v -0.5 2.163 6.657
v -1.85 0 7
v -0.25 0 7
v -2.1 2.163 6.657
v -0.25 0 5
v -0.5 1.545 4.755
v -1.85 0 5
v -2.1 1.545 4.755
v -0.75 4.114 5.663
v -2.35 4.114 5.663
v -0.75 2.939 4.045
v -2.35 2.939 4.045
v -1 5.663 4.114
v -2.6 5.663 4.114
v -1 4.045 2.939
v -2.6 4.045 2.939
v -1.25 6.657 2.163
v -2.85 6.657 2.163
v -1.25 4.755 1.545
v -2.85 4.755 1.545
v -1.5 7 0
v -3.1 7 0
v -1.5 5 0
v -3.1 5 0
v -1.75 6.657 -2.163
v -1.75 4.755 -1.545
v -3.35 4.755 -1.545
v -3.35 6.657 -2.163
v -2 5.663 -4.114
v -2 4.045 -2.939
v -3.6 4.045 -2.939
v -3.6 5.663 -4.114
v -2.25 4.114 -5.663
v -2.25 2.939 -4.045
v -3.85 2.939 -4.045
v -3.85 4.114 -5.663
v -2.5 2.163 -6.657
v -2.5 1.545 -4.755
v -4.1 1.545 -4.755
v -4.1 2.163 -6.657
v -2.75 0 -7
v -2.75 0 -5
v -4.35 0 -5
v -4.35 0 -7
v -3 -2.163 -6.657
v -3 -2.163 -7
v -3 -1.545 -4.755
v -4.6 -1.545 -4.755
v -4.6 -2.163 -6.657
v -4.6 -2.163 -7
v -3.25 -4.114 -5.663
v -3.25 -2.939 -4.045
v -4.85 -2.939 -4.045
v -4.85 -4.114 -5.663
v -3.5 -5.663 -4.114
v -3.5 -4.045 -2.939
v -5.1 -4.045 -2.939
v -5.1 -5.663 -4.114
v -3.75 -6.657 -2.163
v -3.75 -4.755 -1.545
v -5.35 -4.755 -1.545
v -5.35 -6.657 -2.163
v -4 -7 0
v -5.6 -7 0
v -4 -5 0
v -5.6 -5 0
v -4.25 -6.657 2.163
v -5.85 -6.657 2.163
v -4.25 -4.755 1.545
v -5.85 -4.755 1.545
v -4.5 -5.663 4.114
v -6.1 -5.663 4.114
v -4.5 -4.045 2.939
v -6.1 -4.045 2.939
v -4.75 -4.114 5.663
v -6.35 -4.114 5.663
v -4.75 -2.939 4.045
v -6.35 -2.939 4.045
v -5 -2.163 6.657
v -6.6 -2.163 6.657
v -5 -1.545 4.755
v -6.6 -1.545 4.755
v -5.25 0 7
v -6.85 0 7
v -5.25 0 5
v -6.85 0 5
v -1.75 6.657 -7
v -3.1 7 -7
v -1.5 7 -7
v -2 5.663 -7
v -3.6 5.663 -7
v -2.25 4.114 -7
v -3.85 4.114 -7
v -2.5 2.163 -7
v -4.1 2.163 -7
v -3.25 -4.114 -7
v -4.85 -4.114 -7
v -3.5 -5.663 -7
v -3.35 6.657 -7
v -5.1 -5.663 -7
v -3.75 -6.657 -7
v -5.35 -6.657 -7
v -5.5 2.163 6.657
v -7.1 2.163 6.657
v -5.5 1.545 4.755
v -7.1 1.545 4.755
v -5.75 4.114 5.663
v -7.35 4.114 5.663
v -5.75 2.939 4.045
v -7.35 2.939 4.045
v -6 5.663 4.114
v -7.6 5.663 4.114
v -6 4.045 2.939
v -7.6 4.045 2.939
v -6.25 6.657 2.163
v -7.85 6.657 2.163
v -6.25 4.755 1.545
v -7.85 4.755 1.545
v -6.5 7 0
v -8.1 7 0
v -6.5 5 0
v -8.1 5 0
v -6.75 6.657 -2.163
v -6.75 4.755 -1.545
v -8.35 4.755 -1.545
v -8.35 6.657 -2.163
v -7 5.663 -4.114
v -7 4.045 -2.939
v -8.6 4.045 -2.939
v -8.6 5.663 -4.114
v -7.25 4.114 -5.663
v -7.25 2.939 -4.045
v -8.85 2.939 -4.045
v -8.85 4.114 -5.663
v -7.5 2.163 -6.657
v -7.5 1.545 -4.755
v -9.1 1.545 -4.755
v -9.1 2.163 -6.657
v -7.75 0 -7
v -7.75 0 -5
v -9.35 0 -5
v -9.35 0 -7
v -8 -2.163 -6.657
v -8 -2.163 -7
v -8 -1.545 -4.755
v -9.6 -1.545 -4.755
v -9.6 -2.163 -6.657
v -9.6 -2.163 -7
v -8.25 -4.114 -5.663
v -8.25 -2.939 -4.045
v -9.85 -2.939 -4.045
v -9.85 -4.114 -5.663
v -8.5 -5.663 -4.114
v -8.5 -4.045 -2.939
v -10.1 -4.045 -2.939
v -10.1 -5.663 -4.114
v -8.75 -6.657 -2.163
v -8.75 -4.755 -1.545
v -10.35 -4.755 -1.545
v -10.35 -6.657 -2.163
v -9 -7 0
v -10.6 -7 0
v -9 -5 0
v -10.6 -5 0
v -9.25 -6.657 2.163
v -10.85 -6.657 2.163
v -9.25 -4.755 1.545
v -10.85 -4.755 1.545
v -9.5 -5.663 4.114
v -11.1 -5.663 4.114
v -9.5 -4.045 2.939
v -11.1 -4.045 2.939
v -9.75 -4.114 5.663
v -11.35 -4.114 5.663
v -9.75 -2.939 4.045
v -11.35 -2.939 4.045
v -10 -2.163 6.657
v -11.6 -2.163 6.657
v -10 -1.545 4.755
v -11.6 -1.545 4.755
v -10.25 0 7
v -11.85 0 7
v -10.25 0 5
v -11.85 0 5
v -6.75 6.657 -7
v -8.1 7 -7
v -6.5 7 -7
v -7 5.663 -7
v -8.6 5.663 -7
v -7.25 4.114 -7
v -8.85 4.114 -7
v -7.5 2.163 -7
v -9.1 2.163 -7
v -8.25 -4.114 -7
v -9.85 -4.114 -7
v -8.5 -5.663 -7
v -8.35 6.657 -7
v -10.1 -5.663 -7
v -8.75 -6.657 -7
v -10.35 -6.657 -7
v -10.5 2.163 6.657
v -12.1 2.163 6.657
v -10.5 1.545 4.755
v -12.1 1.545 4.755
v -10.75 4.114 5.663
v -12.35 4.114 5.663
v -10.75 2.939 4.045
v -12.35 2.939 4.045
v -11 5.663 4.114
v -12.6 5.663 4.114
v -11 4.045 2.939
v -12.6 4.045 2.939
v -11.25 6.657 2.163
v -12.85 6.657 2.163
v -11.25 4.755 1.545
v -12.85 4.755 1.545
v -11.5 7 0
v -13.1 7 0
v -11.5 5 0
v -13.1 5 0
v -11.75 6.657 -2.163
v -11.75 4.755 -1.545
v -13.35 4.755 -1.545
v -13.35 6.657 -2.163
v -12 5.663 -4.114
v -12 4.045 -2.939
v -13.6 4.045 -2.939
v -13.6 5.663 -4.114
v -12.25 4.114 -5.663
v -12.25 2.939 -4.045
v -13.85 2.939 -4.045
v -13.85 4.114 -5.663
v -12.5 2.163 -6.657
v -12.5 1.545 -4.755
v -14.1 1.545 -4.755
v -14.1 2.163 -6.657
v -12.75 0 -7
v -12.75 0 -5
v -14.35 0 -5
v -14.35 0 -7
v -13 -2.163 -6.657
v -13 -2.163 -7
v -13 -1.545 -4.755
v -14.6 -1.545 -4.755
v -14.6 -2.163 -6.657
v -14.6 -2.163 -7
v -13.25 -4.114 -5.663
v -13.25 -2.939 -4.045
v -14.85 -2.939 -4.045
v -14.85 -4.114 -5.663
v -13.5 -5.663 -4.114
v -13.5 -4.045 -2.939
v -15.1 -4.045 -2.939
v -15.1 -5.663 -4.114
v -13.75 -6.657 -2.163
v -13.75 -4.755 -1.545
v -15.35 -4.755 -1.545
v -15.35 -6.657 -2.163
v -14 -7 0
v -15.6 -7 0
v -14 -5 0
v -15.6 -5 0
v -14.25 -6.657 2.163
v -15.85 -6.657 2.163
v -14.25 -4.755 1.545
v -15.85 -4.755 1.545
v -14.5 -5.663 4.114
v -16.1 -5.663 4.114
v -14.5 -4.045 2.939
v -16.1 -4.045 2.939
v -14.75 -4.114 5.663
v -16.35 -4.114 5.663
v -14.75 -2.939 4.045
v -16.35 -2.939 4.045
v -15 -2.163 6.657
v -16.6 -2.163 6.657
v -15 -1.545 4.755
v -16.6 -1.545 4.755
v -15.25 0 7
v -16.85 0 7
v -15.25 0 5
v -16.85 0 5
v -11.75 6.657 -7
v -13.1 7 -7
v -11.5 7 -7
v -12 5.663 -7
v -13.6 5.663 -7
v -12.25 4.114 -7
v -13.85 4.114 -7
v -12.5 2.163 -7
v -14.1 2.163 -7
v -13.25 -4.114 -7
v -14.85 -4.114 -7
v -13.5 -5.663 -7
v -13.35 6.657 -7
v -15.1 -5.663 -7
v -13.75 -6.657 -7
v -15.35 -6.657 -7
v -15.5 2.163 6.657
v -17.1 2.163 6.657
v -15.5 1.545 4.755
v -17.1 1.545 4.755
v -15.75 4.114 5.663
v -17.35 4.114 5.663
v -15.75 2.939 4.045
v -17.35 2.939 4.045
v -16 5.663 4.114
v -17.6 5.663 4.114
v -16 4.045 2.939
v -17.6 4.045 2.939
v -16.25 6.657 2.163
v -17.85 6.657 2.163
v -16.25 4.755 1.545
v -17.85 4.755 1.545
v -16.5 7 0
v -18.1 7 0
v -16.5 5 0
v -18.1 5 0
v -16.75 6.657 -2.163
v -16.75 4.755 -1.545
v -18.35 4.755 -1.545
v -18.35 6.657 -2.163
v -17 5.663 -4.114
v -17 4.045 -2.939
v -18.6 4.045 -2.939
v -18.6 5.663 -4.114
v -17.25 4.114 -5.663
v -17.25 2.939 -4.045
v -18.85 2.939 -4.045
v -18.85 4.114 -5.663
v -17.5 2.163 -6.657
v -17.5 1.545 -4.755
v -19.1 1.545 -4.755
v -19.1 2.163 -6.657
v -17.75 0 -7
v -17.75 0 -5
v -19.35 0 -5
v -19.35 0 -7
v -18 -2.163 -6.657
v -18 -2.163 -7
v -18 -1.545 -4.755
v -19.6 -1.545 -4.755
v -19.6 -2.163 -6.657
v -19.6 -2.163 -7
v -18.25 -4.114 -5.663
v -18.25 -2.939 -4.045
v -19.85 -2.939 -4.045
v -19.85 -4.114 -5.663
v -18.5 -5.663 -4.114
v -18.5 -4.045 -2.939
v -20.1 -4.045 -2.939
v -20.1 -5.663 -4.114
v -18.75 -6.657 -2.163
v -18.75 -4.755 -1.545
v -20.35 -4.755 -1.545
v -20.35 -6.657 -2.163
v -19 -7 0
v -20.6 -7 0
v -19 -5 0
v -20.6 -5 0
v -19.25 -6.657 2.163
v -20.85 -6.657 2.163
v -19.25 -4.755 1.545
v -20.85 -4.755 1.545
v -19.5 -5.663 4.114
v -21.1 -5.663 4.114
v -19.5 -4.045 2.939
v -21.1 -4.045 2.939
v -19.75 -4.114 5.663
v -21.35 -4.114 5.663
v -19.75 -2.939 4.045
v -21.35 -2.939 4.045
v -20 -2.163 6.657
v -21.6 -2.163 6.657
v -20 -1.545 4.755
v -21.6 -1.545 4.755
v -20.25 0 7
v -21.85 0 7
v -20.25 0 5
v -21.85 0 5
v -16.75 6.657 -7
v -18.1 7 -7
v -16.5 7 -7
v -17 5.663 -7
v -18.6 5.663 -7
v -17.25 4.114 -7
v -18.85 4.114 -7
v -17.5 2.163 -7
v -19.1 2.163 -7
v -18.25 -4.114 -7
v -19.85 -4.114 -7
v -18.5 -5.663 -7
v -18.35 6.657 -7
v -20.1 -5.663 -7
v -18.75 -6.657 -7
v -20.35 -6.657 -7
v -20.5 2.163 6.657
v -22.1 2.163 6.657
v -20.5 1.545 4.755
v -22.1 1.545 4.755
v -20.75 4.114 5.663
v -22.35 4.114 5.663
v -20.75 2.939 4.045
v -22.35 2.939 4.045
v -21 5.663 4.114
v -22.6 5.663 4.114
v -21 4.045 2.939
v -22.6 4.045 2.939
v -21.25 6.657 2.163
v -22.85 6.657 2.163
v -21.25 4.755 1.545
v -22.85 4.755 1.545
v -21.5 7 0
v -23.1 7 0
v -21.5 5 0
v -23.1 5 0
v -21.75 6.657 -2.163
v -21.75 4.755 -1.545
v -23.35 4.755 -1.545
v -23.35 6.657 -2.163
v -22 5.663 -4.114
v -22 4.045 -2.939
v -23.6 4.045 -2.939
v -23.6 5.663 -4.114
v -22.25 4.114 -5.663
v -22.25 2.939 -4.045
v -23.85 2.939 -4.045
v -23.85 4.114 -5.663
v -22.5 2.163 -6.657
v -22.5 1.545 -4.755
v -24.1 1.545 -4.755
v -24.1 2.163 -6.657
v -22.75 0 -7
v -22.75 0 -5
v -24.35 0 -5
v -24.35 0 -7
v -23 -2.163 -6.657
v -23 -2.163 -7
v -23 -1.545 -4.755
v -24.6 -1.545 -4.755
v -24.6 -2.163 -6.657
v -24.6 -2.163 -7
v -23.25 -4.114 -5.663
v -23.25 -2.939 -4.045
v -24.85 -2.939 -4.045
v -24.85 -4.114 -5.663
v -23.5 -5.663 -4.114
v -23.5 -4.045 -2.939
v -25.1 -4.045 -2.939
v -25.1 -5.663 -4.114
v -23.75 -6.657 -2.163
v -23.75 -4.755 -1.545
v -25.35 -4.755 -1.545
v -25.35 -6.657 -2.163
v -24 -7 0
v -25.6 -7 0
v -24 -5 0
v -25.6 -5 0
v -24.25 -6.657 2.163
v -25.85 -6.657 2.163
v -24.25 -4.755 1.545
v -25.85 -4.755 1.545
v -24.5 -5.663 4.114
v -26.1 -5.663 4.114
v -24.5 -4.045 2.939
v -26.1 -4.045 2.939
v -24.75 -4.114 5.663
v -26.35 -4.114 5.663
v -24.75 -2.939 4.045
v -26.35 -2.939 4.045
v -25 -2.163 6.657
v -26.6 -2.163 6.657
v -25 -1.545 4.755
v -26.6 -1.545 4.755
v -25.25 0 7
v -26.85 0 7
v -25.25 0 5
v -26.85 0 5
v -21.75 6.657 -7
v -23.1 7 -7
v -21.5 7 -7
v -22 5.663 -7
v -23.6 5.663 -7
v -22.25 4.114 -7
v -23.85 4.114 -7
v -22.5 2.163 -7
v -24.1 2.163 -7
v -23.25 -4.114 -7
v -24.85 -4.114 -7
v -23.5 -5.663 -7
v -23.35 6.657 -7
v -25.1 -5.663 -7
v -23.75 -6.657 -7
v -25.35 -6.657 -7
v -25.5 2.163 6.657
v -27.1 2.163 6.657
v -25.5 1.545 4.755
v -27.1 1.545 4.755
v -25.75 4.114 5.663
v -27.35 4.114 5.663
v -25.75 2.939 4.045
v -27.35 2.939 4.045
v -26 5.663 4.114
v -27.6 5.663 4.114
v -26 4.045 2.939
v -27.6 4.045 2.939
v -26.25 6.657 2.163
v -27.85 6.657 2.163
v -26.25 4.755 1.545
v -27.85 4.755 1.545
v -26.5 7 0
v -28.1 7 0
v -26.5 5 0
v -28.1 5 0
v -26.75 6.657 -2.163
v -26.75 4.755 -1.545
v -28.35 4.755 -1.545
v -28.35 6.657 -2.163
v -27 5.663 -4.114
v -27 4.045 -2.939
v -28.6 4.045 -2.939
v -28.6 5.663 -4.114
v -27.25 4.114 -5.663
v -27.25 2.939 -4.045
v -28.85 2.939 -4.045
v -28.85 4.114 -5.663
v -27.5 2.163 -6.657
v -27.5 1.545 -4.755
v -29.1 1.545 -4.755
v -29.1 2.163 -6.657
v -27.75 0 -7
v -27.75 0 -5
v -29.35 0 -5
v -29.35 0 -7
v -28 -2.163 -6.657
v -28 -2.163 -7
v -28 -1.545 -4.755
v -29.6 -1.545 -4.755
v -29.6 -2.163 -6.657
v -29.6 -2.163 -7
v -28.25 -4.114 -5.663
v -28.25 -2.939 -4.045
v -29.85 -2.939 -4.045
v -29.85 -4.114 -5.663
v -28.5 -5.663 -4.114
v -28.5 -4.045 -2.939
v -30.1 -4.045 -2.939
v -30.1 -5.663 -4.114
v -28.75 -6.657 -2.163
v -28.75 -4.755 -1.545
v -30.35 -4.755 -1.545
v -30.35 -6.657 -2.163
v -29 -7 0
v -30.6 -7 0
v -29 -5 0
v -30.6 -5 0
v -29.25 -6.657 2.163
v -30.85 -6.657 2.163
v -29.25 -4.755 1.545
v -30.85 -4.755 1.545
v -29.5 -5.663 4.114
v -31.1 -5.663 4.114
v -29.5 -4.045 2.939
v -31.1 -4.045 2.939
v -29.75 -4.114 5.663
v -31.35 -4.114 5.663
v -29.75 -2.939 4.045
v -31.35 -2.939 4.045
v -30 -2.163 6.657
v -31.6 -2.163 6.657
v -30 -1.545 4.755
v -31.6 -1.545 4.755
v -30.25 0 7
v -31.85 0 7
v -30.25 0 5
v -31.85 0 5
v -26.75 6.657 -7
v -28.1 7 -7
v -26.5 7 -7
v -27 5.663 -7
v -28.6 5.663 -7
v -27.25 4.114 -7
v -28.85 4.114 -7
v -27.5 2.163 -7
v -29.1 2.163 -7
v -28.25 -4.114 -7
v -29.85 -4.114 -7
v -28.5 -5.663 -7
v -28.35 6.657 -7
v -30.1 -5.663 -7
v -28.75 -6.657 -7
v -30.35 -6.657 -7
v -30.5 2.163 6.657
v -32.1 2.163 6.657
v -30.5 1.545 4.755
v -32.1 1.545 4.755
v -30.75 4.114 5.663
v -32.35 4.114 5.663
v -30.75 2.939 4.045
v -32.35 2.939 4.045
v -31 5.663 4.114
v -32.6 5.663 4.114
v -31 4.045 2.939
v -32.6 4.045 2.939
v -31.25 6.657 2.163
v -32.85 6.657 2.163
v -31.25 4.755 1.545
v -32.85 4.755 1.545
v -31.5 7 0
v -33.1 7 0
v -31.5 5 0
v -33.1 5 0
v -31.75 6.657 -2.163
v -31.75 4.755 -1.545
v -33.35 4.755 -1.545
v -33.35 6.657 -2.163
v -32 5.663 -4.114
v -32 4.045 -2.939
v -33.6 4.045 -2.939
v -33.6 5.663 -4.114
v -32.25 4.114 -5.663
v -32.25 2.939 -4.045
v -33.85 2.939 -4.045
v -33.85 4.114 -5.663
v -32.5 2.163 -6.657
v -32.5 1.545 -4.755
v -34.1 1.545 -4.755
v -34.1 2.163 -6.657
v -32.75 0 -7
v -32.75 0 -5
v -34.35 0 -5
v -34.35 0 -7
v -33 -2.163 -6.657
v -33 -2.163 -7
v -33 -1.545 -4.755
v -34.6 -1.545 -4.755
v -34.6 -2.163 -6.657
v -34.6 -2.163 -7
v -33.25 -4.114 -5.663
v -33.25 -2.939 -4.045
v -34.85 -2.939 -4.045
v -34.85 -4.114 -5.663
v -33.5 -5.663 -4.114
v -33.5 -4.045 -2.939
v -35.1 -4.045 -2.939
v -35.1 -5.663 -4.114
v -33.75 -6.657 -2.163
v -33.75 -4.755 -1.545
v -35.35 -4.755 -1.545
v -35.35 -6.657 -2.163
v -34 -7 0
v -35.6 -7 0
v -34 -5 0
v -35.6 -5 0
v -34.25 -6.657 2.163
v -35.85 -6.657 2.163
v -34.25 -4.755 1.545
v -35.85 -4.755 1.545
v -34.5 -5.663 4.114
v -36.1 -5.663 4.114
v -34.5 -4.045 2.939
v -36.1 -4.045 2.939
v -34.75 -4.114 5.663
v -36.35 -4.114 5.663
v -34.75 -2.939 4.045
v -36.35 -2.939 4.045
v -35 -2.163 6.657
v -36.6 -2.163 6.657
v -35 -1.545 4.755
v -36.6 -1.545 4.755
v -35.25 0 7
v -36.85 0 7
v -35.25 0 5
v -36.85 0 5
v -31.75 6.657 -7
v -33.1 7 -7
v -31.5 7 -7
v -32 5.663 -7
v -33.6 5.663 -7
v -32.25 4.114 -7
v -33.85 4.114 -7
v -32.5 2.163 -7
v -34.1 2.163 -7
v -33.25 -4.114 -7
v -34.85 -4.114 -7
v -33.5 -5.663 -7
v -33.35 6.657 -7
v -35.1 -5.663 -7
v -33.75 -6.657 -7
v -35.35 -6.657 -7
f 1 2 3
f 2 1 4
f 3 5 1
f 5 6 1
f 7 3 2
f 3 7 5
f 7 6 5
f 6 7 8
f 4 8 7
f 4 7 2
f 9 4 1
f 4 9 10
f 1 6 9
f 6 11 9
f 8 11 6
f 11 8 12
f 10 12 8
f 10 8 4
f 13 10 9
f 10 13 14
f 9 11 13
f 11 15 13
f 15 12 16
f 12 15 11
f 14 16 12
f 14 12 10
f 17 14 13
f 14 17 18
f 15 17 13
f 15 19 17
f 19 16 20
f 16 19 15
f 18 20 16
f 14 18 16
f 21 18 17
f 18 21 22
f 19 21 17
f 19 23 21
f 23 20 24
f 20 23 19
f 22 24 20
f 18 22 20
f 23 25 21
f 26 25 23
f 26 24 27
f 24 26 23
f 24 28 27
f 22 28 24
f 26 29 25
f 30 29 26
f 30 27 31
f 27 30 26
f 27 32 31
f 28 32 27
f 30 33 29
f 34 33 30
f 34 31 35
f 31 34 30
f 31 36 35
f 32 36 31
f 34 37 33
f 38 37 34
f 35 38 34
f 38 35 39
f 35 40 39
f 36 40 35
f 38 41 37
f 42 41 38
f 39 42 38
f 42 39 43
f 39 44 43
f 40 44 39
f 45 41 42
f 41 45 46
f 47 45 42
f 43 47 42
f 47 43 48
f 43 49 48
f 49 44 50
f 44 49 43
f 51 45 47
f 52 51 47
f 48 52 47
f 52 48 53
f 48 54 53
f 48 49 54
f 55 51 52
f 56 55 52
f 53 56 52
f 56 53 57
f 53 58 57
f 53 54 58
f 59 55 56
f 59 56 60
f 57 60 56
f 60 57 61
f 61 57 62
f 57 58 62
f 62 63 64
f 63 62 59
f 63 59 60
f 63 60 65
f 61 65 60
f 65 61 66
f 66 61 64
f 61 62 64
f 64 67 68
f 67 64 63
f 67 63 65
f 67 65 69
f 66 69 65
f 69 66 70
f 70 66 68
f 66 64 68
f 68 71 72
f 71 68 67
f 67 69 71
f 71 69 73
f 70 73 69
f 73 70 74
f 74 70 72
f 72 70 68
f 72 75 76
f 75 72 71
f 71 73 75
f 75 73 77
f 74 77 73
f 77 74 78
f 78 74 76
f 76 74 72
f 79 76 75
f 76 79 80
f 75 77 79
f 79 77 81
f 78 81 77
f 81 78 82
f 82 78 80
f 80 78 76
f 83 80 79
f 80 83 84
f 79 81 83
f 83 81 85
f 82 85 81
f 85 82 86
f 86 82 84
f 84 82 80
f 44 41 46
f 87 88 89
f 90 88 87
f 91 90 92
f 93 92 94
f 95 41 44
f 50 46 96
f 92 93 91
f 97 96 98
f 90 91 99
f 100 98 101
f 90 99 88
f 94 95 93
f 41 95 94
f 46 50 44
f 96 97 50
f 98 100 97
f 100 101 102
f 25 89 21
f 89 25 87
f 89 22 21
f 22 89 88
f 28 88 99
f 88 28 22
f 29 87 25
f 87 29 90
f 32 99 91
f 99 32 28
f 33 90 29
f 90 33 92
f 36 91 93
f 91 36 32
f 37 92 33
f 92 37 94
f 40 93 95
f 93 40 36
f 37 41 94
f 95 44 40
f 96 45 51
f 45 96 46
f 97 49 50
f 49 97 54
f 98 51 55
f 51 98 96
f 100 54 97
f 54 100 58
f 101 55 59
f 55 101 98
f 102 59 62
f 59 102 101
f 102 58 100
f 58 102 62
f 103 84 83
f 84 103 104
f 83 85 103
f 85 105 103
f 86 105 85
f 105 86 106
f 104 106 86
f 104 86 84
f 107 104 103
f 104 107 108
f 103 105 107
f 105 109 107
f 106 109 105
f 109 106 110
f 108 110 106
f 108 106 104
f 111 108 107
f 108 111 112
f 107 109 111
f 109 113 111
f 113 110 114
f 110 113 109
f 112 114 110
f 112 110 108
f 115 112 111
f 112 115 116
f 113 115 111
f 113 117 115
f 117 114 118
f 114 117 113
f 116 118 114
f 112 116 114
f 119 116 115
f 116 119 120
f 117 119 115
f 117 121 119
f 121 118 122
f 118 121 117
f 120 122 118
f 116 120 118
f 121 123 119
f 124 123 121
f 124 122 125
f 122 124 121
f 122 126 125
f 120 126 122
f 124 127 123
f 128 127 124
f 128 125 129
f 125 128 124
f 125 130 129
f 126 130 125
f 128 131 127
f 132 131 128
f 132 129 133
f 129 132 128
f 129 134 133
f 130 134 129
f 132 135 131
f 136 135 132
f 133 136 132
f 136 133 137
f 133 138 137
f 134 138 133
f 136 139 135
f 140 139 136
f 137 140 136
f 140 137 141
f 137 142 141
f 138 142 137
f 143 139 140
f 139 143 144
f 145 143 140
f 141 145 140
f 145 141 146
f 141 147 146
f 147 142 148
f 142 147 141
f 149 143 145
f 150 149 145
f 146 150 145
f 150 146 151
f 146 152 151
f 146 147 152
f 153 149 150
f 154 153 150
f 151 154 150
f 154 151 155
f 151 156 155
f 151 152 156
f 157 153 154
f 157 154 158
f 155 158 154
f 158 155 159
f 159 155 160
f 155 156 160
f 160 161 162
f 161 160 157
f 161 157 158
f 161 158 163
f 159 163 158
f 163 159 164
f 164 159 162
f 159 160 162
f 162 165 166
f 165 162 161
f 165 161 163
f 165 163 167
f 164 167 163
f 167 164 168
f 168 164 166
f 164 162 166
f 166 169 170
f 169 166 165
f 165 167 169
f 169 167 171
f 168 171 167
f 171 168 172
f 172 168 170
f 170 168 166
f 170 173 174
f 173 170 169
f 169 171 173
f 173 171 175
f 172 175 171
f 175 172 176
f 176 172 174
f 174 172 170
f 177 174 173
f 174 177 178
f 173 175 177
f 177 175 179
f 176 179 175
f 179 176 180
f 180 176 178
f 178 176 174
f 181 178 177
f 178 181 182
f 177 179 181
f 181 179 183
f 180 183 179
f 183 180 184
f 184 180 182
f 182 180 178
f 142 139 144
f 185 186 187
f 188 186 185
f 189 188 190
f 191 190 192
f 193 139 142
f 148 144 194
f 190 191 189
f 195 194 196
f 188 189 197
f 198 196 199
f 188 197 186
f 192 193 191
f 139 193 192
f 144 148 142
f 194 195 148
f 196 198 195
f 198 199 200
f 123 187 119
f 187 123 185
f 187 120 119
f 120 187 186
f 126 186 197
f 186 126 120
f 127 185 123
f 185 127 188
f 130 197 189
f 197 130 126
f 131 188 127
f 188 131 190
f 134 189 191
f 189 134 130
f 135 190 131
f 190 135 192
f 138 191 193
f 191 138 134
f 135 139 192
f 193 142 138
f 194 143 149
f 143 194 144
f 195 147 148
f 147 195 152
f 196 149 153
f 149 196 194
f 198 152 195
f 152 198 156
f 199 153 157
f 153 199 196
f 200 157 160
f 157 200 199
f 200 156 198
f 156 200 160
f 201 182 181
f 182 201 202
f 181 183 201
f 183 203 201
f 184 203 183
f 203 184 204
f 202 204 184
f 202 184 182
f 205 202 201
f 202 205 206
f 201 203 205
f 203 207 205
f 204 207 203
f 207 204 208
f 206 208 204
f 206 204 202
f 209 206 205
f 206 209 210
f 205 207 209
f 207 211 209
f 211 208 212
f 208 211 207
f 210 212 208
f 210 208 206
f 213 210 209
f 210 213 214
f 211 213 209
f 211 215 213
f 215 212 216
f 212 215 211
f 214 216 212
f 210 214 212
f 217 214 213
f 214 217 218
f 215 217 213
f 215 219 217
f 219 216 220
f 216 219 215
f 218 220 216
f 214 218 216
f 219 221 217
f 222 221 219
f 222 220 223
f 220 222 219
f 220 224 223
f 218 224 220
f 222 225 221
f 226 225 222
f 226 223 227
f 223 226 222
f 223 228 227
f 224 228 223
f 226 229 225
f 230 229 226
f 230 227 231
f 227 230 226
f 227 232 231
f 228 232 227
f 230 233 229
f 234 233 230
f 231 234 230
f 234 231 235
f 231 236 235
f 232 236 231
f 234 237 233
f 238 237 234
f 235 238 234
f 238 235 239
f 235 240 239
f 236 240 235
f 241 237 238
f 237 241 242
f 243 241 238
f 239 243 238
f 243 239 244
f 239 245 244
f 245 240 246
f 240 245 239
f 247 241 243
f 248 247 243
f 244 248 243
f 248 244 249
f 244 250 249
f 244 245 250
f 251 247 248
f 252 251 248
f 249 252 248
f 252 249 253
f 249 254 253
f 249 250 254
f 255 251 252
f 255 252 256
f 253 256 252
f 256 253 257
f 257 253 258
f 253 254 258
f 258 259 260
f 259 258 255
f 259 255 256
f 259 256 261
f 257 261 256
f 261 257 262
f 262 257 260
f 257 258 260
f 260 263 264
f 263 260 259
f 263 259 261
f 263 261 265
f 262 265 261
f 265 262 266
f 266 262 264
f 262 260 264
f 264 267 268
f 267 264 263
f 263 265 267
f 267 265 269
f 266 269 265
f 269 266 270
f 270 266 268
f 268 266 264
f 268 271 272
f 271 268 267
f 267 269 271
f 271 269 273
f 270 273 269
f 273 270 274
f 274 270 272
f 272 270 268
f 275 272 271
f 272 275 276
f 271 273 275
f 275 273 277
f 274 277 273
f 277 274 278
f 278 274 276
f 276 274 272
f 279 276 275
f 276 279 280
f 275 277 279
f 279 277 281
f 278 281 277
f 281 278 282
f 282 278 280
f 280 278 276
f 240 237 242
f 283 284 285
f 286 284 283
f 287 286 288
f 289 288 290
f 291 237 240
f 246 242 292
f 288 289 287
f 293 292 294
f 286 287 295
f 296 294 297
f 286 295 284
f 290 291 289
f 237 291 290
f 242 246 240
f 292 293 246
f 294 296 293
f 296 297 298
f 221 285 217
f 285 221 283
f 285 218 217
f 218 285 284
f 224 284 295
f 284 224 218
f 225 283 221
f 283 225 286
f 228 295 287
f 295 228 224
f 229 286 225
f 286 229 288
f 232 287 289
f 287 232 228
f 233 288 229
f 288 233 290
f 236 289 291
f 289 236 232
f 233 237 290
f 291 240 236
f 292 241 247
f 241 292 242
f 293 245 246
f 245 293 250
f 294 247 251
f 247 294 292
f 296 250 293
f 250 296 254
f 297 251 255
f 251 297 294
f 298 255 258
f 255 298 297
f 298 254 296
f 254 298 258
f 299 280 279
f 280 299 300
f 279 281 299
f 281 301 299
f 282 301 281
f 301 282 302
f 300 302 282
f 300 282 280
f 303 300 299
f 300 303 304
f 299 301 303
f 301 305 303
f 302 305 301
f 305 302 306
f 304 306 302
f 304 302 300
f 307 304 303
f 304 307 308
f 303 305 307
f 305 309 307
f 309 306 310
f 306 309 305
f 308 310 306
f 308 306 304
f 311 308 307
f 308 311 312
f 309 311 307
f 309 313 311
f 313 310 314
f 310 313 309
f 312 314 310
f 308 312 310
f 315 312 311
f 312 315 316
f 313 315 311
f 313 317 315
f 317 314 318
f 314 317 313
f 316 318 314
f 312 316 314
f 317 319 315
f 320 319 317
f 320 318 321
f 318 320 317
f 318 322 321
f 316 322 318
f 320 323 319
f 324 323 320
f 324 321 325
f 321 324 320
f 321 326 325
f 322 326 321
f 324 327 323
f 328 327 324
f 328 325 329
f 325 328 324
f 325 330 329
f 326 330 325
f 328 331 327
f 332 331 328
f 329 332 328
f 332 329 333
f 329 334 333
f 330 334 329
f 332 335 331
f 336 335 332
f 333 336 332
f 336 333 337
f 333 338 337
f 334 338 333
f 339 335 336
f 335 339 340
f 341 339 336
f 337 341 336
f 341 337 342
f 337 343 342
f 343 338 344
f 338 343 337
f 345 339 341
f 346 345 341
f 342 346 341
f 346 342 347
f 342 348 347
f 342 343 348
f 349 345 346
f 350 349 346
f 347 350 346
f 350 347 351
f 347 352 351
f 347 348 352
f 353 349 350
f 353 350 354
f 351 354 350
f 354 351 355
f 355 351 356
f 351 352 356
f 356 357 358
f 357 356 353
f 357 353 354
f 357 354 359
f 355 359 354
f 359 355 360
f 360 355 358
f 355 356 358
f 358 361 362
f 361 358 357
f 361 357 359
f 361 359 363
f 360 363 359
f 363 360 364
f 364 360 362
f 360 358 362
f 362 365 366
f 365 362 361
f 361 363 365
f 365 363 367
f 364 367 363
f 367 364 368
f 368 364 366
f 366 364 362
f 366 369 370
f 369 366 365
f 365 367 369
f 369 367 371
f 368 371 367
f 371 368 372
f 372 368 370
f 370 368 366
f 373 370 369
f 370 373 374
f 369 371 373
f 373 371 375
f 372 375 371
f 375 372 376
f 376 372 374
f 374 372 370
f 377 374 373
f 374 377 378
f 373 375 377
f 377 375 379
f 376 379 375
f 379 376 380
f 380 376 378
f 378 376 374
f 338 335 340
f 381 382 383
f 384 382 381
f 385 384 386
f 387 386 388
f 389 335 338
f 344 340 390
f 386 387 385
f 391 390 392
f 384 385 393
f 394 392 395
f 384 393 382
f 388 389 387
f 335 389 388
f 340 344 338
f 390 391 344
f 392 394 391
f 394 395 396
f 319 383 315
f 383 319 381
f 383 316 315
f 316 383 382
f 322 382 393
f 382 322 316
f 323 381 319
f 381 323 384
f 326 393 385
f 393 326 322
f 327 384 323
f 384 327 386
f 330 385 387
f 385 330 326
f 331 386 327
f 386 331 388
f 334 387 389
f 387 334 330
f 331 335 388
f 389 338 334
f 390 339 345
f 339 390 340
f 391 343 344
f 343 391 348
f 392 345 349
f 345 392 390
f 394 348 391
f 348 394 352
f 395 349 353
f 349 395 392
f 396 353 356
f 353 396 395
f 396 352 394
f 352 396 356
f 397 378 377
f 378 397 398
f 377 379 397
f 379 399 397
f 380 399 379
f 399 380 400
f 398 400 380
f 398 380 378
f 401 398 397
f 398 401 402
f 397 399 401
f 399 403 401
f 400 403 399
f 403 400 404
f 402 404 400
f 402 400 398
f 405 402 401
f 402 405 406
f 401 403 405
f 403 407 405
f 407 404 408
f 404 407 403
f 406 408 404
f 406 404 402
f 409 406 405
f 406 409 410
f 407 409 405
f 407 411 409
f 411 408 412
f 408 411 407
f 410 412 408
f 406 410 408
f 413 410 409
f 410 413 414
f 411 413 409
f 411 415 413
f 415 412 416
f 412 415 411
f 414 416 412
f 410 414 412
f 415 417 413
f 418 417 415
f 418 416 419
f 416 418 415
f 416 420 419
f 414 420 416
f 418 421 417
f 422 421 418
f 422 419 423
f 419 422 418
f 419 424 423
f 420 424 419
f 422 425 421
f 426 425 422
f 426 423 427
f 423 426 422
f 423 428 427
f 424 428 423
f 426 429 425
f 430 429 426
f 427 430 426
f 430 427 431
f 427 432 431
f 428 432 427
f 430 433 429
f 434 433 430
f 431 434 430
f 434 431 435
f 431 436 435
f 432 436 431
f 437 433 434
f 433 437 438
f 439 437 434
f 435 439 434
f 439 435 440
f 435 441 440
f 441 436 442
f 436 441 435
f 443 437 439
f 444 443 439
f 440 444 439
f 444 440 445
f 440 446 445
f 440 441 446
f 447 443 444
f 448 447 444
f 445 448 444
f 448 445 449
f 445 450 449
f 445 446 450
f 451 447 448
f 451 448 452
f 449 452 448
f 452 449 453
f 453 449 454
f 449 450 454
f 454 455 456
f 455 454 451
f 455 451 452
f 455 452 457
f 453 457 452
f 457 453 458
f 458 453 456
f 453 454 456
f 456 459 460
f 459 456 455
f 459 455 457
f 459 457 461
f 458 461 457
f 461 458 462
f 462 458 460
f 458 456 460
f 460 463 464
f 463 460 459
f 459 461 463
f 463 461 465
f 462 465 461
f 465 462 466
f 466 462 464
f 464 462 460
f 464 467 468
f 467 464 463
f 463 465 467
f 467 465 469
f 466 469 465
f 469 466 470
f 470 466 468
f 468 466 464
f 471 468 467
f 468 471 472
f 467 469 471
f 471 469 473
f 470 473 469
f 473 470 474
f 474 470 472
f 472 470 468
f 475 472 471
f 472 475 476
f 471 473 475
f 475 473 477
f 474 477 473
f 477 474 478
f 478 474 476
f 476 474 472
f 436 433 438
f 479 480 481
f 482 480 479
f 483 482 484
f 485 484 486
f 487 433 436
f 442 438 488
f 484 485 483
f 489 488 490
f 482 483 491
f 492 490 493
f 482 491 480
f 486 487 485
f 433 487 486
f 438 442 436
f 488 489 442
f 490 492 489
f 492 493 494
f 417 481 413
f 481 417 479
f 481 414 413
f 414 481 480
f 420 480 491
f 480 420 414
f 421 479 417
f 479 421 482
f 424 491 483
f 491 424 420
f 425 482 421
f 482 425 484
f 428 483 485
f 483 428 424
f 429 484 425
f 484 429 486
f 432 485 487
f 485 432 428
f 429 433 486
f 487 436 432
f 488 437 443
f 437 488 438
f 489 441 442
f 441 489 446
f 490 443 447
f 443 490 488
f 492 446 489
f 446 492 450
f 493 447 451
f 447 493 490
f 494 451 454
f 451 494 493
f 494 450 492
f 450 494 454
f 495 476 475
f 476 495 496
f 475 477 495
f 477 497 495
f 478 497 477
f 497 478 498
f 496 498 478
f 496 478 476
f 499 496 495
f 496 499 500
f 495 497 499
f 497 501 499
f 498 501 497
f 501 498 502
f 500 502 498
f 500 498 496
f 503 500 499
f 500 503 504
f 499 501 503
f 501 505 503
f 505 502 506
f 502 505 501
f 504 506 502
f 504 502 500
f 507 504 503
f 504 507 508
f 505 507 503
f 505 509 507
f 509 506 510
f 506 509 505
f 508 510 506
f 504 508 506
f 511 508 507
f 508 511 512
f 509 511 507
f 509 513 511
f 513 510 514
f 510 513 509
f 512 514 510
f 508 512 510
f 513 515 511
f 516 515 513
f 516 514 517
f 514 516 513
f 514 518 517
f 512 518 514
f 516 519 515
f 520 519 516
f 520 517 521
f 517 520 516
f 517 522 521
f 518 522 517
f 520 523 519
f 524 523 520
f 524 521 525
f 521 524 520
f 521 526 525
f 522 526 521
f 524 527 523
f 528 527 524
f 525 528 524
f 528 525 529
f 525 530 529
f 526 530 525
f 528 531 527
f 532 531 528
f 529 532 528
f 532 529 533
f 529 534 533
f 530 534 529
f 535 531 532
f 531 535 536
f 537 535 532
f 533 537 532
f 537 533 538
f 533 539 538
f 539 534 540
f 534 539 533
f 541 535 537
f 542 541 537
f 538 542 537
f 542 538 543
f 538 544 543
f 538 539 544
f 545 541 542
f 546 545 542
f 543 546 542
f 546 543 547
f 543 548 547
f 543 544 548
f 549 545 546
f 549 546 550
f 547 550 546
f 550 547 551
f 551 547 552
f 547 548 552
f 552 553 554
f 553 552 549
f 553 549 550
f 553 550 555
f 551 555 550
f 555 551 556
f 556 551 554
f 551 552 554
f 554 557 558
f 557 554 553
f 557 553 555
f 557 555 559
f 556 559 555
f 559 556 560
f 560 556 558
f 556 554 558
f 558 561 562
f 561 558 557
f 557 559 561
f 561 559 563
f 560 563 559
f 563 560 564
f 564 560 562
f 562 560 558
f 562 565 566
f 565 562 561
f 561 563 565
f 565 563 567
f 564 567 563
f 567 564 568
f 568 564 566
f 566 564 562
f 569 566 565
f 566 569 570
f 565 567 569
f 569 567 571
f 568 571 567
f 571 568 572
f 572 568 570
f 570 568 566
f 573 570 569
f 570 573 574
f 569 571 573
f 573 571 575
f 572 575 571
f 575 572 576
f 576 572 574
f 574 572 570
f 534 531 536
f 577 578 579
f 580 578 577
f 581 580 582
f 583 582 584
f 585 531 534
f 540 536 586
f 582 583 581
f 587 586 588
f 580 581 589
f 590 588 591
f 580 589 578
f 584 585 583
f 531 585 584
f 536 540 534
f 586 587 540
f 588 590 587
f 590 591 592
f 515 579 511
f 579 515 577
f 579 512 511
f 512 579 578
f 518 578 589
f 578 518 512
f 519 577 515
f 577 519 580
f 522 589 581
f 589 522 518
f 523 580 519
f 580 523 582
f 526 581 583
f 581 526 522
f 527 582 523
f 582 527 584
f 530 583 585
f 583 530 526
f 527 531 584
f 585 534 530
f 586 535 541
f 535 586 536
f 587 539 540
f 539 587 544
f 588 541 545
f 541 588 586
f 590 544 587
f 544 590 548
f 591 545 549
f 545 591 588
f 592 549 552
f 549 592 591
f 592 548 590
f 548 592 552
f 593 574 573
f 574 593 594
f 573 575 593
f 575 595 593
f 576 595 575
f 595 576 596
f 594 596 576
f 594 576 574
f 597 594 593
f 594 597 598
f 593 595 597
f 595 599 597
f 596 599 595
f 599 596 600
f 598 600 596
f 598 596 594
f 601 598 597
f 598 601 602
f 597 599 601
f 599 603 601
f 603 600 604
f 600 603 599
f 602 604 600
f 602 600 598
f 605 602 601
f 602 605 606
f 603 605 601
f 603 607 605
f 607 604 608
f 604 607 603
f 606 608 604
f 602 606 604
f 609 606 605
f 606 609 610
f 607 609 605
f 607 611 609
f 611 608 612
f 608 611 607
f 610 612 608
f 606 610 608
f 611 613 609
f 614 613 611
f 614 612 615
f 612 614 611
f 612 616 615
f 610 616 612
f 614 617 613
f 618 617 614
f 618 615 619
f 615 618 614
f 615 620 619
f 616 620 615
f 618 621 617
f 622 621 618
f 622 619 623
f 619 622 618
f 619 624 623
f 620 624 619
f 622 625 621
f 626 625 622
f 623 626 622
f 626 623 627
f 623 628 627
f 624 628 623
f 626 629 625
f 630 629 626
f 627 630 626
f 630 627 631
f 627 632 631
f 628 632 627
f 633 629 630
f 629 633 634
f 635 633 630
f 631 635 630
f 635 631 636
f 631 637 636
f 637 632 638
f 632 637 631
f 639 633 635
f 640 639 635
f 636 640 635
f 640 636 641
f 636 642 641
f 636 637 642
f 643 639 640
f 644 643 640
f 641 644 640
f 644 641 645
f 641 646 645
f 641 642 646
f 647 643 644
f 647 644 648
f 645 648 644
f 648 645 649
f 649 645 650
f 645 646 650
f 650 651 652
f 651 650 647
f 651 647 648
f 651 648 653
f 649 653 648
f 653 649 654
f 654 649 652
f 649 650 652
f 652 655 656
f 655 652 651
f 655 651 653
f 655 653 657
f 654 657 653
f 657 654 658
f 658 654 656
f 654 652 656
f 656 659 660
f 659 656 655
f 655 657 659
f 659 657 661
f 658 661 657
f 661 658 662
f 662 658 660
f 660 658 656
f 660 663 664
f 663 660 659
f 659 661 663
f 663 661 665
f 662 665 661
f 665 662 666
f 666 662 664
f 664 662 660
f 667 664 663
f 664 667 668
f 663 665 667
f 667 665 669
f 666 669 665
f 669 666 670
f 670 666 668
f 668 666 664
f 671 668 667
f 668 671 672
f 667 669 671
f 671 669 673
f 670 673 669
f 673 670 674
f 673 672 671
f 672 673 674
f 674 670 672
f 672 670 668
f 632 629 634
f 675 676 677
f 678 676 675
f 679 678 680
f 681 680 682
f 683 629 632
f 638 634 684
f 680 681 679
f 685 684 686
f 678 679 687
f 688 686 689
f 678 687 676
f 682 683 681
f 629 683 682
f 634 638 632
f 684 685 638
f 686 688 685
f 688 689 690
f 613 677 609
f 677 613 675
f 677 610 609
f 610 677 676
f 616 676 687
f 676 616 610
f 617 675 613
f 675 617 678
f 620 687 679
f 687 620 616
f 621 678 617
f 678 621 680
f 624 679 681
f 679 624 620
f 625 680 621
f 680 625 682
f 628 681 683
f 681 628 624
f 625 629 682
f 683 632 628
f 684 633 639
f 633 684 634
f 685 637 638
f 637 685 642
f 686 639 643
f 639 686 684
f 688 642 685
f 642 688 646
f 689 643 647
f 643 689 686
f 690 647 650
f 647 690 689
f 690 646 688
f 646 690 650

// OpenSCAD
/*
  3D Printed Spring
  Copyright Nir Dobovizki 2016
  Provided under the Creative Commons Attribution-NonCommercial 4.0 International (CC-BY-NC)
  Contact me at nir@nbdtech.com
*/

// Number of sides
sides = 20;
// Inner radius of the loops
radius = 5;
// Number of loops
loops = 7;
// Loops width
width = 2;
// Loop thickness
height = 1.6;
// distance between loops
loopHeight = 5;
 
ptOuter = ngon(sides,radius+width);
ptInner = ngon(sides,radius);

rotate([0,270,0])
union(){

for(i=[0:loops-1])
{
    base = loopHeight*i;

    for(j=[1:sides])
    {
        polyhedron(
            points = [
                [ptOuter[(j-1)%sides][0],ptOuter[((j-1)%sides)%sides][1],base+(j*(loopHeight/sides))],
                [ptOuter[j%sides][0],ptOuter[j%sides][1],base+((j+1)*(loopHeight/sides))],
                [ptOuter[(j-1)%sides][0],ptOuter[(j-1)%sides][1],base+height+(j*(loopHeight/sides))],
                [ptOuter[j%sides][0],ptOuter[j%sides][1],base+height+((j+1)*(loopHeight/sides))],
                [ptInner[(j-1)%sides][0],ptInner[(j-1)%sides][1],base+(j*(loopHeight/sides))],
                [ptInner[j%sides][0],ptInner[j%sides][1],base+((j+1)*(loopHeight/sides))],
                [ptInner[(j-1)%sides][0],ptInner[(j-1)%sides][1],base+height+(j*(loopHeight/sides))],
                [ptInner[j%sides][0],ptInner[j%sides][1],base+height+((j+1)*(loopHeight/sides))]
                ],
            faces = [
                [0,1,2],[1,3,2], //right
                [1,0,4],[4,5,1], //bottom
                [2,4,0],[2,6,4], //back
                [6,5,4],[6,7,5], //left
                [1,5,7],[7,3,1], //front
                [3,7,6],[6,2,3]  //top
        ]);
    }
    for(j=[sides/4+1:(sides/4)*3-1])
    {
        polyhedron(
            points = [
                [-(radius+width),ptOuter[((j-1)%sides)%sides][1],base+(j*(loopHeight/sides))],
                [-(radius+width),ptOuter[j%sides][1],base+((j+1)*(loopHeight/sides))],
                [-(radius+width),ptOuter[(j-1)%sides][1],base+height+(j*(loopHeight/sides))],
                [-(radius+width),ptOuter[j%sides][1],base+height+((j+1)*(loopHeight/sides))],
                [ptOuter[(j-1)%sides][0],ptOuter[((j-1)%sides)%sides][1],base+(j*(loopHeight/sides))],
                [ptOuter[j%sides][0],ptOuter[j%sides][1],base+((j+1)*(loopHeight/sides))],
                [ptOuter[(j-1)%sides][0],ptOuter[(j-1)%sides][1],base+height+((j)*(loopHeight/sides))],
                [ptOuter[j%sides][0],ptOuter[j%sides][1],base+height+((j+1)*(loopHeight/sides))]
                ],
            faces = [
                [0,1,2],[1,3,2], //right
                [1,0,4],[4,5,1], //bottom
                [2,4,0],[2,6,4], //back
                [6,5,4],[6,7,5], //left
                [1,5,7],[7,3,1], //front
                [3,7,6],[6,2,3]  //top
        ]);
    }
}
 
 }
// Simple list comprehension for creating N-gon vertices
function ngon(num, r) = 
  [for (i=[0:num-1], a=i*360/num) [ r*cos(a), r*sin(a) ]];
